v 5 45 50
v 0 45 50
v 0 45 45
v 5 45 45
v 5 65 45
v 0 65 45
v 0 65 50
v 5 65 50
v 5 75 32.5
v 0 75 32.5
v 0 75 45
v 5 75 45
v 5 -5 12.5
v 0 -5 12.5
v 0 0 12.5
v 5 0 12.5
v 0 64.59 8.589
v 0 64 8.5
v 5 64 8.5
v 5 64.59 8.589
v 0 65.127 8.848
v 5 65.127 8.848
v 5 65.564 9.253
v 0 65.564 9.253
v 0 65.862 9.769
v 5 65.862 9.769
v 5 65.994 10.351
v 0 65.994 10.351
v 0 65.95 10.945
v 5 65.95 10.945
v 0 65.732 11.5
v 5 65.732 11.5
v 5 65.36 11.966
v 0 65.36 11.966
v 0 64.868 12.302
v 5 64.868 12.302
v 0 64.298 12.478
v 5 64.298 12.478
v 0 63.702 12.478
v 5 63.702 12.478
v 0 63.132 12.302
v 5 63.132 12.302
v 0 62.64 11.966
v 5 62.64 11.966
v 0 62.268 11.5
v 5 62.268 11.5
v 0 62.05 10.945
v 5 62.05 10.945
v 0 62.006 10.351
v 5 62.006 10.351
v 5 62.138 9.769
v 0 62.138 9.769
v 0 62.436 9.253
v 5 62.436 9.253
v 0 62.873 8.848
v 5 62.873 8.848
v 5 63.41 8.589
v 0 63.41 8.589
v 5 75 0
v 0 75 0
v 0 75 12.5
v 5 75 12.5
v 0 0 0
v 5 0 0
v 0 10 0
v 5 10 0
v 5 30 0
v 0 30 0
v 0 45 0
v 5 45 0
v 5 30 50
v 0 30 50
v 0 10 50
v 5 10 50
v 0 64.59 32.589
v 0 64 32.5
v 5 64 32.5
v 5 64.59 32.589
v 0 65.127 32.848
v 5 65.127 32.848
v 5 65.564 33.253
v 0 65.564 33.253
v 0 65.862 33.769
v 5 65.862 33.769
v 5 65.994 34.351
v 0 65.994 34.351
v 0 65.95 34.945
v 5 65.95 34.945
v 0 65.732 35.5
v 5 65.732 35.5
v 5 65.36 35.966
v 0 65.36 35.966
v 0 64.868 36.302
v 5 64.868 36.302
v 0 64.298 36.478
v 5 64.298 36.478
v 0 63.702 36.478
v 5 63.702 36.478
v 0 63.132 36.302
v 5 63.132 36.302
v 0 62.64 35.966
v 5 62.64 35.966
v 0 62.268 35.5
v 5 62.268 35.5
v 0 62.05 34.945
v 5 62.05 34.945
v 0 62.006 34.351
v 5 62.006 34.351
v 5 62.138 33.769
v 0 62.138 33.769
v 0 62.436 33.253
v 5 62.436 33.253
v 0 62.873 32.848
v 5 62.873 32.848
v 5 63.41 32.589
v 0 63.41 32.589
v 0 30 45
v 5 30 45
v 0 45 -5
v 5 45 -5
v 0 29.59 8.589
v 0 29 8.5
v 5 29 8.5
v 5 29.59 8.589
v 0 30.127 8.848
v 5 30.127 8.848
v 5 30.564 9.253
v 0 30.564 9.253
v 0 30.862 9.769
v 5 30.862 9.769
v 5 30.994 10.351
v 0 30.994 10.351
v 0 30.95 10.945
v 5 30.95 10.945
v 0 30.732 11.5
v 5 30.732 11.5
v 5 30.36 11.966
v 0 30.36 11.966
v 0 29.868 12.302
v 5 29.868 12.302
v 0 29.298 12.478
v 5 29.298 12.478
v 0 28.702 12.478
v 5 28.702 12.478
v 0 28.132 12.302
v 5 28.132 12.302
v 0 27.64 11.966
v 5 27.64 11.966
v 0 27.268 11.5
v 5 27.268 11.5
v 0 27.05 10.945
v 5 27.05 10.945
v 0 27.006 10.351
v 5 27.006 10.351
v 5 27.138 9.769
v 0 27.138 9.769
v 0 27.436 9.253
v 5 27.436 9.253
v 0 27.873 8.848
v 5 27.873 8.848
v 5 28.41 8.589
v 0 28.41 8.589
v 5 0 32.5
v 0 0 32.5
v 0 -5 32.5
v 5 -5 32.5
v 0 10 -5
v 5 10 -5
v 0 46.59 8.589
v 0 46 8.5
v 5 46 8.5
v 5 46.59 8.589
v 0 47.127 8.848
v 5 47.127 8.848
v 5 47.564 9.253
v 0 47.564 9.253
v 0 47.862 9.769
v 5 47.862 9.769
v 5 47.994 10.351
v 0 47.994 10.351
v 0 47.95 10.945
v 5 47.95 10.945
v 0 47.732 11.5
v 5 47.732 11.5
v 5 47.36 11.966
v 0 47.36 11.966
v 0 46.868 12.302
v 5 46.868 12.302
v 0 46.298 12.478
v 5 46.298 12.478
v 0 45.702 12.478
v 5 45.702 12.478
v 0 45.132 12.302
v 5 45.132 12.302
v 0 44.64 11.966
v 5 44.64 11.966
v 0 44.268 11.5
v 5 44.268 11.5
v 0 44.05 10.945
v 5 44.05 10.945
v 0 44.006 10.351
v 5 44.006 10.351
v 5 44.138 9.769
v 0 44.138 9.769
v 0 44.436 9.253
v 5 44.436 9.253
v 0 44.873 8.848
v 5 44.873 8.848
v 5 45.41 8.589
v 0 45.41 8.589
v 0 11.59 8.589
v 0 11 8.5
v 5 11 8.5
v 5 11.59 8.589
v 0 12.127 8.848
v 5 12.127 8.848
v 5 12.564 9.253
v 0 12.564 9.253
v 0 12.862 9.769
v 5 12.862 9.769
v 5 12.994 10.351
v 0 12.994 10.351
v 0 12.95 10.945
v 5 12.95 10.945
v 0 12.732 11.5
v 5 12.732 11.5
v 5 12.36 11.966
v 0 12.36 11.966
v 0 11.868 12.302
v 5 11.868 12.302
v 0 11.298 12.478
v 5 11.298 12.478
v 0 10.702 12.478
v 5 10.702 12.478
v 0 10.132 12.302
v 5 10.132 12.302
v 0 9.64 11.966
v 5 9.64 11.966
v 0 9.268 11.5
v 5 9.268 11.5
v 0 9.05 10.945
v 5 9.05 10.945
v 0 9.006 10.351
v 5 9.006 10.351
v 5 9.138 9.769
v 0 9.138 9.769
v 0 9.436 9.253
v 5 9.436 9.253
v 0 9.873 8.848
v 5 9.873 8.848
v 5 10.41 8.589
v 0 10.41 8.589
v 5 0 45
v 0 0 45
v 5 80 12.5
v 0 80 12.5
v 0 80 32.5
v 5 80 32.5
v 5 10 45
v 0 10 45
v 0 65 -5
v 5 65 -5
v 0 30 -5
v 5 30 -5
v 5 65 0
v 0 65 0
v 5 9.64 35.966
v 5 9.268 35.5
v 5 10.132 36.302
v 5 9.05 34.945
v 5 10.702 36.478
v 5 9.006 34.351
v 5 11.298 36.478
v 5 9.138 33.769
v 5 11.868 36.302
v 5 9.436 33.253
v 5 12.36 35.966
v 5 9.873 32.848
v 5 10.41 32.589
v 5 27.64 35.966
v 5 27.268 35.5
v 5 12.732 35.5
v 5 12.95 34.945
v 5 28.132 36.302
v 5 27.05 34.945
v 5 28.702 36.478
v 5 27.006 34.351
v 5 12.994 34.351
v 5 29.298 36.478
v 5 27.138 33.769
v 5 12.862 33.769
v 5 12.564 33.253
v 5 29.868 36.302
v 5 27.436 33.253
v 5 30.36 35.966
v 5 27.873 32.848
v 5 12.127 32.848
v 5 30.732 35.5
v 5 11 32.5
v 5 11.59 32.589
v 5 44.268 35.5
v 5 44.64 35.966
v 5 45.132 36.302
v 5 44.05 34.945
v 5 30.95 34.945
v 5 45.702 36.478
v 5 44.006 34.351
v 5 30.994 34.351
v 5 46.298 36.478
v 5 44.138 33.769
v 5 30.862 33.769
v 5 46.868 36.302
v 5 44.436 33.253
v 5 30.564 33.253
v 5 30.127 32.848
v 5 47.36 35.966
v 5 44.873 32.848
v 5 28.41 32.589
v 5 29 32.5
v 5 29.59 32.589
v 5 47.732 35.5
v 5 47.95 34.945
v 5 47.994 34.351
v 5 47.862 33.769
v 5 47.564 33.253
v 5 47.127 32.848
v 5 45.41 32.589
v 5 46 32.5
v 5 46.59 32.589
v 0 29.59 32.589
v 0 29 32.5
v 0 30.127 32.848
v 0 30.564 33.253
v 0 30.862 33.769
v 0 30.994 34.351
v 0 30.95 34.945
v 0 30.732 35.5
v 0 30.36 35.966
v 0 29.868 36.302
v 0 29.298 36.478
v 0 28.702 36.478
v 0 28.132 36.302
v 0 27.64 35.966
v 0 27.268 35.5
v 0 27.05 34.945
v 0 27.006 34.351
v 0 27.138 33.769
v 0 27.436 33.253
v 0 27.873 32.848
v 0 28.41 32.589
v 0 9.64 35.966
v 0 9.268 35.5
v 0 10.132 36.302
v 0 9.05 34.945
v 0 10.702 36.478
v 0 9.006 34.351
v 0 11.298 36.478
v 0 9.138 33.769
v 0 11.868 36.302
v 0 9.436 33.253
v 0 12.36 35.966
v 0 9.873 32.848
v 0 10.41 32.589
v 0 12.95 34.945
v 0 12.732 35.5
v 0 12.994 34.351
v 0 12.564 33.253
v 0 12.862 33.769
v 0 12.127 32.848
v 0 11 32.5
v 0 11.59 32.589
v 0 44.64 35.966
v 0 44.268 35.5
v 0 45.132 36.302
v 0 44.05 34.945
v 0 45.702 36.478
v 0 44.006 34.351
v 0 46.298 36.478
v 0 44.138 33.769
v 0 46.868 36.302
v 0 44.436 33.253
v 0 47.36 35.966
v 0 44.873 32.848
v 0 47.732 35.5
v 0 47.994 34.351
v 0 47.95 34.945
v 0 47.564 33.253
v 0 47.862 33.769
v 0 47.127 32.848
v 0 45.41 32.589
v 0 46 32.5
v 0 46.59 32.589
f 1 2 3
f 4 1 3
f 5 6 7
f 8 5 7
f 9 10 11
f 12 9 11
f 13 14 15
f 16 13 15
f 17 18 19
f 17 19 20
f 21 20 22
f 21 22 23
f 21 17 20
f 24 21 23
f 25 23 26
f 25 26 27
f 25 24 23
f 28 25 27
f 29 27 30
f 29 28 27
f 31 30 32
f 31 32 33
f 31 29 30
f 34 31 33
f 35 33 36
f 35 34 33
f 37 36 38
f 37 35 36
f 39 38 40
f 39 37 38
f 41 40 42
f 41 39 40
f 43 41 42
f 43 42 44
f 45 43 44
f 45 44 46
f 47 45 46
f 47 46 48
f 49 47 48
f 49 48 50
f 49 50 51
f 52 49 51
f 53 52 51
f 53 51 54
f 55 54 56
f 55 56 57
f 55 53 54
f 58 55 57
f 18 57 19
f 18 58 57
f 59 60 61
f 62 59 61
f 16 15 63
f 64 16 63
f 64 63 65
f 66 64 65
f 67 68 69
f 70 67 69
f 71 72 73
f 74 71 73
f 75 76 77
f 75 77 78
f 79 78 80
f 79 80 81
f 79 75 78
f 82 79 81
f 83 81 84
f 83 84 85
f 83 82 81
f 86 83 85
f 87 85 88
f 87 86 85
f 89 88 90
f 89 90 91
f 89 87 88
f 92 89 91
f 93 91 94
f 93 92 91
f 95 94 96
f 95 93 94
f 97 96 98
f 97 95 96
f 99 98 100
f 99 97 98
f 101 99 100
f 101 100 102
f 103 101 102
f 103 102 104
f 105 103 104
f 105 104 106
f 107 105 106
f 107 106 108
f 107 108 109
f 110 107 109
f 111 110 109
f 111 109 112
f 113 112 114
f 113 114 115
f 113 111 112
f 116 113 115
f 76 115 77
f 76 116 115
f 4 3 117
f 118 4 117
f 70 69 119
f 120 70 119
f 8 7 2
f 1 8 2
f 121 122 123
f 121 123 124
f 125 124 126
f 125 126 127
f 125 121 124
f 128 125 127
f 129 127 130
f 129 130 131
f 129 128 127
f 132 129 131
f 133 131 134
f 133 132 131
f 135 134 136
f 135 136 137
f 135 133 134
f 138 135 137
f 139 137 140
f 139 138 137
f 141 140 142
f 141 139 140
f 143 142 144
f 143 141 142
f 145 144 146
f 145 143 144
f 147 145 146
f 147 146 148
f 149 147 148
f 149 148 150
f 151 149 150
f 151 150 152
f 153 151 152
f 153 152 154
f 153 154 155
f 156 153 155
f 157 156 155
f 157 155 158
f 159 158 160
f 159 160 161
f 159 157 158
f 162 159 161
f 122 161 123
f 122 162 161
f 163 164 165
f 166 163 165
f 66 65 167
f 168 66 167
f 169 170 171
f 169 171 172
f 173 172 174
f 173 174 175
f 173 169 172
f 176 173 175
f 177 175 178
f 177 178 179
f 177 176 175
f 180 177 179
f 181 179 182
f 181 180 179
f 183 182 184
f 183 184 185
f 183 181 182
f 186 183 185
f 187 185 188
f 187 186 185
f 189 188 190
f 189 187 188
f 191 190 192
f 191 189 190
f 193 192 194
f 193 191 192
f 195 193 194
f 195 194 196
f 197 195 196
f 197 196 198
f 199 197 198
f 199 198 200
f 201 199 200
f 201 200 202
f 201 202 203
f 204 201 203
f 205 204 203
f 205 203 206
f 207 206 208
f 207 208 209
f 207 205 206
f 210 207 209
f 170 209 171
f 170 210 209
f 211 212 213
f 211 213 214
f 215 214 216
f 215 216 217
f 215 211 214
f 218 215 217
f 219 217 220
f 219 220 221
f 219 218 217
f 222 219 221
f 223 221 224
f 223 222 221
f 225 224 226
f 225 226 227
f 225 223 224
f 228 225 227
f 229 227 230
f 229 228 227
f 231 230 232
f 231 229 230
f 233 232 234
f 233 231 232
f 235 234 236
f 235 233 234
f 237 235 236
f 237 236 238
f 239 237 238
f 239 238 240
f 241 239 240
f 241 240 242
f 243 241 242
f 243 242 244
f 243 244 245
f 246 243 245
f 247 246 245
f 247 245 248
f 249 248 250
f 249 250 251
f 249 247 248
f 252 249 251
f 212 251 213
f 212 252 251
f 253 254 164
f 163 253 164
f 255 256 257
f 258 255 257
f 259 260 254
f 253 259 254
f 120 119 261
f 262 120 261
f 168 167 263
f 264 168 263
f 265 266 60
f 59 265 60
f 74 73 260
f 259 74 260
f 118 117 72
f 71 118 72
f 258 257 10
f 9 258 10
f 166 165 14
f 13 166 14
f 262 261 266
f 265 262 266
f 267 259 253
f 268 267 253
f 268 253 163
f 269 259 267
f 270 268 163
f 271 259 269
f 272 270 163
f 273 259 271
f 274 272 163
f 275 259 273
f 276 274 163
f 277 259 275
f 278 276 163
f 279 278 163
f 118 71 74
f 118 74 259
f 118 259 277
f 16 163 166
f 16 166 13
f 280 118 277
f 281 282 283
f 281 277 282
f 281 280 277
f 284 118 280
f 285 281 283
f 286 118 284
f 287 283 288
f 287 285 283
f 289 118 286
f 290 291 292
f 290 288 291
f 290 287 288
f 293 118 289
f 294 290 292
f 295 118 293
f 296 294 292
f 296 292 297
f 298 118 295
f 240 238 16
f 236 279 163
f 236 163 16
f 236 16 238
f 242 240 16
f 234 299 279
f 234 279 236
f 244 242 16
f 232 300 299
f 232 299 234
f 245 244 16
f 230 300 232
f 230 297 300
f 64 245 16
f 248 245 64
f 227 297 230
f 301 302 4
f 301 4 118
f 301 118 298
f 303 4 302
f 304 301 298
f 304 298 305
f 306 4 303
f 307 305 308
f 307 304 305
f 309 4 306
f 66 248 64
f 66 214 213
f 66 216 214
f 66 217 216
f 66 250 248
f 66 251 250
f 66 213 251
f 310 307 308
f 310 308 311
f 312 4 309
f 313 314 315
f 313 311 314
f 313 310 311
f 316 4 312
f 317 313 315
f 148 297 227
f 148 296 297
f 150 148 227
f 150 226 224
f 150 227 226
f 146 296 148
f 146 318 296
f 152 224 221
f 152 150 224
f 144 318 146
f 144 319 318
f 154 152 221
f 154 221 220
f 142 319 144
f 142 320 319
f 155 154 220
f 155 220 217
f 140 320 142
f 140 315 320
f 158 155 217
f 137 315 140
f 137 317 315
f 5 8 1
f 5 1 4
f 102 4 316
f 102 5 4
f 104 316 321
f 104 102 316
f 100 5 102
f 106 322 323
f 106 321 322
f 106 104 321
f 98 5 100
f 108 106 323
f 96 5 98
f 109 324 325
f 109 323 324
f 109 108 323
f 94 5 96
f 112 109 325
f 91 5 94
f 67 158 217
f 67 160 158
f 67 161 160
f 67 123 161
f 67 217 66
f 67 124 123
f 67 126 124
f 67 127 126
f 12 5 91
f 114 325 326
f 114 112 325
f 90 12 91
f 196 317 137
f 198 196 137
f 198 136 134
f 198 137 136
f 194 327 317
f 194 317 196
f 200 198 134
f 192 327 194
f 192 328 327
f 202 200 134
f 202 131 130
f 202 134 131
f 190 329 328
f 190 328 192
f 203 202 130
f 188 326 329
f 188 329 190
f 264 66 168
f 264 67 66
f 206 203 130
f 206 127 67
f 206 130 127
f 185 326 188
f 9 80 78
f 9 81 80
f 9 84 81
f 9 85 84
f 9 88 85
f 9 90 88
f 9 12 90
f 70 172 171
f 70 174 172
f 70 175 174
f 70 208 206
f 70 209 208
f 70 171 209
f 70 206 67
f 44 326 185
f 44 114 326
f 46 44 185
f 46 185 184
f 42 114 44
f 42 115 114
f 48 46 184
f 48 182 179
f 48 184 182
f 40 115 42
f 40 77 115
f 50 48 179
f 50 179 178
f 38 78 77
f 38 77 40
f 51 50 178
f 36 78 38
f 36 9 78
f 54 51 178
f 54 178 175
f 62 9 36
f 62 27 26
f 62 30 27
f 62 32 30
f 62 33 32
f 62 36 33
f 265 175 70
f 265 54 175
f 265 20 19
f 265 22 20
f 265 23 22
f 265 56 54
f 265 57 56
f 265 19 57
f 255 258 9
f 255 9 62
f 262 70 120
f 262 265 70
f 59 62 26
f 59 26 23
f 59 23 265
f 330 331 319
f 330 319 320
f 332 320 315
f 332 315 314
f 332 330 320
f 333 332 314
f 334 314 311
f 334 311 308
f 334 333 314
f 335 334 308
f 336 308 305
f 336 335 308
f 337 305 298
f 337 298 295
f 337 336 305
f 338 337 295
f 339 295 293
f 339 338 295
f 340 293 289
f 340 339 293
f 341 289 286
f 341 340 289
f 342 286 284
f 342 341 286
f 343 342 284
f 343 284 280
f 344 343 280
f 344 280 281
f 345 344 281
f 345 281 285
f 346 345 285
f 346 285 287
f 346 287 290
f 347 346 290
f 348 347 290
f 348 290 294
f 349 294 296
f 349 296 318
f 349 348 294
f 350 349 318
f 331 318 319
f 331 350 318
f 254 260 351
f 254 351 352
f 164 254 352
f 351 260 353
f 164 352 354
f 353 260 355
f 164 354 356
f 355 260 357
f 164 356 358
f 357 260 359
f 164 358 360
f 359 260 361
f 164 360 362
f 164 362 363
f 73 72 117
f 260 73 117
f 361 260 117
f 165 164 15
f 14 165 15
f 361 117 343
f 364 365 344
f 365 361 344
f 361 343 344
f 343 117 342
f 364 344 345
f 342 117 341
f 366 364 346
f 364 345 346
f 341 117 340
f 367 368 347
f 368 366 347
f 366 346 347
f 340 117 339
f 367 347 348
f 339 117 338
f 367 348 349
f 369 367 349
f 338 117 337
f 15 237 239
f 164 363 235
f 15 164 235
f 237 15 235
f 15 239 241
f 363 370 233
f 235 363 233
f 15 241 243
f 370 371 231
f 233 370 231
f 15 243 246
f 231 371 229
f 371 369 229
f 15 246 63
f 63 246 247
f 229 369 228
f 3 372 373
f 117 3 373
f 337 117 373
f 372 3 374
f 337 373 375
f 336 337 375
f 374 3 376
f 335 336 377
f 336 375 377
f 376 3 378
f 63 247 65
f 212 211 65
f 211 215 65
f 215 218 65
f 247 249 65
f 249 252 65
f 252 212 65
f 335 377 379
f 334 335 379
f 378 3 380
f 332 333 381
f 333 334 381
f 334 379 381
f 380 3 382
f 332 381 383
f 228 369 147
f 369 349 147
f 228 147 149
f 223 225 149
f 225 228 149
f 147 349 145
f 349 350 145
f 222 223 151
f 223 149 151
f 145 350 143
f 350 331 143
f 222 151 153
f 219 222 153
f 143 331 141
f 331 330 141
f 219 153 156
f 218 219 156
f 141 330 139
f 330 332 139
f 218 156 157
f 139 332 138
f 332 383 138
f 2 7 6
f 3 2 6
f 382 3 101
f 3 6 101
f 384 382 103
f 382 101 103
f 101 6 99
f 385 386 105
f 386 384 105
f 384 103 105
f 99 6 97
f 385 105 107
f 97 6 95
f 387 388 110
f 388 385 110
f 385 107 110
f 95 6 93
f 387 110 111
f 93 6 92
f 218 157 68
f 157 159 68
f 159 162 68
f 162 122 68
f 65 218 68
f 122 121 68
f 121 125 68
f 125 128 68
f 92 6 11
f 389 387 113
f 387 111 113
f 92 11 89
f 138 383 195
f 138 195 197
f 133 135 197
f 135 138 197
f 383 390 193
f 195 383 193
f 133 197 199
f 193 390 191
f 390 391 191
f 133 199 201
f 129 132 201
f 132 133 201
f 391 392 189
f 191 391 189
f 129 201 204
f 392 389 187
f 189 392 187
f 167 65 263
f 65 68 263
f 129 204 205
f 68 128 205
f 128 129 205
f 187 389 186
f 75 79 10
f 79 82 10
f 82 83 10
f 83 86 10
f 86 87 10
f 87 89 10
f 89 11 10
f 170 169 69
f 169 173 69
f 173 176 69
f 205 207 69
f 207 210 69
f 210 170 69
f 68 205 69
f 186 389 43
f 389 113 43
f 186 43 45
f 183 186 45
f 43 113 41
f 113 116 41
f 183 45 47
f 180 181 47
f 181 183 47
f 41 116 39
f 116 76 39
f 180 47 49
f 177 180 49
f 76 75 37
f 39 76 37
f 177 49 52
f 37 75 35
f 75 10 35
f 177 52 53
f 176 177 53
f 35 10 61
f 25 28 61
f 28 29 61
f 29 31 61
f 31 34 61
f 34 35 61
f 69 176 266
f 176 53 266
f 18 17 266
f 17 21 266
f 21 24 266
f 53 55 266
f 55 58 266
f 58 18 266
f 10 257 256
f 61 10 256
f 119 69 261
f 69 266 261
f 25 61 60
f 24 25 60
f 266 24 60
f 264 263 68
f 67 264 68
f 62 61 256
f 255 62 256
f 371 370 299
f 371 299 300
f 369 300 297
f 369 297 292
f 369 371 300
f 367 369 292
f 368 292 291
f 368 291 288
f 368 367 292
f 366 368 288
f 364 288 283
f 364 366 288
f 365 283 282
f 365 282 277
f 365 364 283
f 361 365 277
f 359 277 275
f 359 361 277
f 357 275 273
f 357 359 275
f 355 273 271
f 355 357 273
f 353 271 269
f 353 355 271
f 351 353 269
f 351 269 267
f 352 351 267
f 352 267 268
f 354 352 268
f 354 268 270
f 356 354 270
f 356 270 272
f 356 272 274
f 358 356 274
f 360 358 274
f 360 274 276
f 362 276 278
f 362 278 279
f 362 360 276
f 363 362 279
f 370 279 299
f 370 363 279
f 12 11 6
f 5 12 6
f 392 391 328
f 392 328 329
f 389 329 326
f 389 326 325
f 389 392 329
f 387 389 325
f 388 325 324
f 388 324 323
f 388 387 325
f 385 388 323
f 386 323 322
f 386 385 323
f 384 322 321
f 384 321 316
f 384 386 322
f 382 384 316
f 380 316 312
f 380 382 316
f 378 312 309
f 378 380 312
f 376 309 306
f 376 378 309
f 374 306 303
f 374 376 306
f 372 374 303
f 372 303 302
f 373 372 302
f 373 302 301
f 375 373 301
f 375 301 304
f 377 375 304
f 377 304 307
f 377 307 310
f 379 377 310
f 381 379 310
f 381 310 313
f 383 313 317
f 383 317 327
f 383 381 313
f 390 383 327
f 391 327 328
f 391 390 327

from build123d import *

# Parameters (mm, degrees)
SKETCH_1_R      = 2
EXTRUDE_1_DEPTH = 5


with BuildPart() as part:
    # 草图1 → 凸台-拉伸1 (new body)
    with BuildSketch(Plane(origin=(0, 0, 0), x_dir=(0, 0, -1), z_dir=(1, 0, 0))):
        Polygon((-32.5, 75), (-45, 75), (-45, 65), (-50, 65), (-50, 45), (-45, 45), (-45, 30), (-50, 30), (-50, 10), (-45, 10), (-45, 0), (-32.5, 0), (-32.5, -5), (-12.5, -5), (-12.5, 0), (0, 0), (0, 10), (5, 10), (5, 30), (0, 30), (0, 45), (5, 45), (5, 65), (0, 65), (0, 75), (-12.5, 75), (-12.5, 80), (-32.5, 80), align=None)
        with Locations((-34.5, 64)):
            Circle(SKETCH_1_R, mode=Mode.SUBTRACT)
        with Locations((-10.5, 64)):
            Circle(SKETCH_1_R, mode=Mode.SUBTRACT)
        with Locations((-34.5, 46)):
            Circle(SKETCH_1_R, mode=Mode.SUBTRACT)
        with Locations((-10.5, 46)):
            Circle(SKETCH_1_R, mode=Mode.SUBTRACT)
        with Locations((-34.5, 11)):
            Circle(SKETCH_1_R, mode=Mode.SUBTRACT)
        with Locations((-10.5, 11)):
            Circle(SKETCH_1_R, mode=Mode.SUBTRACT)
        with Locations((-10.5, 29)):
            Circle(SKETCH_1_R, mode=Mode.SUBTRACT)
        with Locations((-34.5, 29)):
            Circle(SKETCH_1_R, mode=Mode.SUBTRACT)
    extrude(amount=EXTRUDE_1_DEPTH)


solid = part.part
